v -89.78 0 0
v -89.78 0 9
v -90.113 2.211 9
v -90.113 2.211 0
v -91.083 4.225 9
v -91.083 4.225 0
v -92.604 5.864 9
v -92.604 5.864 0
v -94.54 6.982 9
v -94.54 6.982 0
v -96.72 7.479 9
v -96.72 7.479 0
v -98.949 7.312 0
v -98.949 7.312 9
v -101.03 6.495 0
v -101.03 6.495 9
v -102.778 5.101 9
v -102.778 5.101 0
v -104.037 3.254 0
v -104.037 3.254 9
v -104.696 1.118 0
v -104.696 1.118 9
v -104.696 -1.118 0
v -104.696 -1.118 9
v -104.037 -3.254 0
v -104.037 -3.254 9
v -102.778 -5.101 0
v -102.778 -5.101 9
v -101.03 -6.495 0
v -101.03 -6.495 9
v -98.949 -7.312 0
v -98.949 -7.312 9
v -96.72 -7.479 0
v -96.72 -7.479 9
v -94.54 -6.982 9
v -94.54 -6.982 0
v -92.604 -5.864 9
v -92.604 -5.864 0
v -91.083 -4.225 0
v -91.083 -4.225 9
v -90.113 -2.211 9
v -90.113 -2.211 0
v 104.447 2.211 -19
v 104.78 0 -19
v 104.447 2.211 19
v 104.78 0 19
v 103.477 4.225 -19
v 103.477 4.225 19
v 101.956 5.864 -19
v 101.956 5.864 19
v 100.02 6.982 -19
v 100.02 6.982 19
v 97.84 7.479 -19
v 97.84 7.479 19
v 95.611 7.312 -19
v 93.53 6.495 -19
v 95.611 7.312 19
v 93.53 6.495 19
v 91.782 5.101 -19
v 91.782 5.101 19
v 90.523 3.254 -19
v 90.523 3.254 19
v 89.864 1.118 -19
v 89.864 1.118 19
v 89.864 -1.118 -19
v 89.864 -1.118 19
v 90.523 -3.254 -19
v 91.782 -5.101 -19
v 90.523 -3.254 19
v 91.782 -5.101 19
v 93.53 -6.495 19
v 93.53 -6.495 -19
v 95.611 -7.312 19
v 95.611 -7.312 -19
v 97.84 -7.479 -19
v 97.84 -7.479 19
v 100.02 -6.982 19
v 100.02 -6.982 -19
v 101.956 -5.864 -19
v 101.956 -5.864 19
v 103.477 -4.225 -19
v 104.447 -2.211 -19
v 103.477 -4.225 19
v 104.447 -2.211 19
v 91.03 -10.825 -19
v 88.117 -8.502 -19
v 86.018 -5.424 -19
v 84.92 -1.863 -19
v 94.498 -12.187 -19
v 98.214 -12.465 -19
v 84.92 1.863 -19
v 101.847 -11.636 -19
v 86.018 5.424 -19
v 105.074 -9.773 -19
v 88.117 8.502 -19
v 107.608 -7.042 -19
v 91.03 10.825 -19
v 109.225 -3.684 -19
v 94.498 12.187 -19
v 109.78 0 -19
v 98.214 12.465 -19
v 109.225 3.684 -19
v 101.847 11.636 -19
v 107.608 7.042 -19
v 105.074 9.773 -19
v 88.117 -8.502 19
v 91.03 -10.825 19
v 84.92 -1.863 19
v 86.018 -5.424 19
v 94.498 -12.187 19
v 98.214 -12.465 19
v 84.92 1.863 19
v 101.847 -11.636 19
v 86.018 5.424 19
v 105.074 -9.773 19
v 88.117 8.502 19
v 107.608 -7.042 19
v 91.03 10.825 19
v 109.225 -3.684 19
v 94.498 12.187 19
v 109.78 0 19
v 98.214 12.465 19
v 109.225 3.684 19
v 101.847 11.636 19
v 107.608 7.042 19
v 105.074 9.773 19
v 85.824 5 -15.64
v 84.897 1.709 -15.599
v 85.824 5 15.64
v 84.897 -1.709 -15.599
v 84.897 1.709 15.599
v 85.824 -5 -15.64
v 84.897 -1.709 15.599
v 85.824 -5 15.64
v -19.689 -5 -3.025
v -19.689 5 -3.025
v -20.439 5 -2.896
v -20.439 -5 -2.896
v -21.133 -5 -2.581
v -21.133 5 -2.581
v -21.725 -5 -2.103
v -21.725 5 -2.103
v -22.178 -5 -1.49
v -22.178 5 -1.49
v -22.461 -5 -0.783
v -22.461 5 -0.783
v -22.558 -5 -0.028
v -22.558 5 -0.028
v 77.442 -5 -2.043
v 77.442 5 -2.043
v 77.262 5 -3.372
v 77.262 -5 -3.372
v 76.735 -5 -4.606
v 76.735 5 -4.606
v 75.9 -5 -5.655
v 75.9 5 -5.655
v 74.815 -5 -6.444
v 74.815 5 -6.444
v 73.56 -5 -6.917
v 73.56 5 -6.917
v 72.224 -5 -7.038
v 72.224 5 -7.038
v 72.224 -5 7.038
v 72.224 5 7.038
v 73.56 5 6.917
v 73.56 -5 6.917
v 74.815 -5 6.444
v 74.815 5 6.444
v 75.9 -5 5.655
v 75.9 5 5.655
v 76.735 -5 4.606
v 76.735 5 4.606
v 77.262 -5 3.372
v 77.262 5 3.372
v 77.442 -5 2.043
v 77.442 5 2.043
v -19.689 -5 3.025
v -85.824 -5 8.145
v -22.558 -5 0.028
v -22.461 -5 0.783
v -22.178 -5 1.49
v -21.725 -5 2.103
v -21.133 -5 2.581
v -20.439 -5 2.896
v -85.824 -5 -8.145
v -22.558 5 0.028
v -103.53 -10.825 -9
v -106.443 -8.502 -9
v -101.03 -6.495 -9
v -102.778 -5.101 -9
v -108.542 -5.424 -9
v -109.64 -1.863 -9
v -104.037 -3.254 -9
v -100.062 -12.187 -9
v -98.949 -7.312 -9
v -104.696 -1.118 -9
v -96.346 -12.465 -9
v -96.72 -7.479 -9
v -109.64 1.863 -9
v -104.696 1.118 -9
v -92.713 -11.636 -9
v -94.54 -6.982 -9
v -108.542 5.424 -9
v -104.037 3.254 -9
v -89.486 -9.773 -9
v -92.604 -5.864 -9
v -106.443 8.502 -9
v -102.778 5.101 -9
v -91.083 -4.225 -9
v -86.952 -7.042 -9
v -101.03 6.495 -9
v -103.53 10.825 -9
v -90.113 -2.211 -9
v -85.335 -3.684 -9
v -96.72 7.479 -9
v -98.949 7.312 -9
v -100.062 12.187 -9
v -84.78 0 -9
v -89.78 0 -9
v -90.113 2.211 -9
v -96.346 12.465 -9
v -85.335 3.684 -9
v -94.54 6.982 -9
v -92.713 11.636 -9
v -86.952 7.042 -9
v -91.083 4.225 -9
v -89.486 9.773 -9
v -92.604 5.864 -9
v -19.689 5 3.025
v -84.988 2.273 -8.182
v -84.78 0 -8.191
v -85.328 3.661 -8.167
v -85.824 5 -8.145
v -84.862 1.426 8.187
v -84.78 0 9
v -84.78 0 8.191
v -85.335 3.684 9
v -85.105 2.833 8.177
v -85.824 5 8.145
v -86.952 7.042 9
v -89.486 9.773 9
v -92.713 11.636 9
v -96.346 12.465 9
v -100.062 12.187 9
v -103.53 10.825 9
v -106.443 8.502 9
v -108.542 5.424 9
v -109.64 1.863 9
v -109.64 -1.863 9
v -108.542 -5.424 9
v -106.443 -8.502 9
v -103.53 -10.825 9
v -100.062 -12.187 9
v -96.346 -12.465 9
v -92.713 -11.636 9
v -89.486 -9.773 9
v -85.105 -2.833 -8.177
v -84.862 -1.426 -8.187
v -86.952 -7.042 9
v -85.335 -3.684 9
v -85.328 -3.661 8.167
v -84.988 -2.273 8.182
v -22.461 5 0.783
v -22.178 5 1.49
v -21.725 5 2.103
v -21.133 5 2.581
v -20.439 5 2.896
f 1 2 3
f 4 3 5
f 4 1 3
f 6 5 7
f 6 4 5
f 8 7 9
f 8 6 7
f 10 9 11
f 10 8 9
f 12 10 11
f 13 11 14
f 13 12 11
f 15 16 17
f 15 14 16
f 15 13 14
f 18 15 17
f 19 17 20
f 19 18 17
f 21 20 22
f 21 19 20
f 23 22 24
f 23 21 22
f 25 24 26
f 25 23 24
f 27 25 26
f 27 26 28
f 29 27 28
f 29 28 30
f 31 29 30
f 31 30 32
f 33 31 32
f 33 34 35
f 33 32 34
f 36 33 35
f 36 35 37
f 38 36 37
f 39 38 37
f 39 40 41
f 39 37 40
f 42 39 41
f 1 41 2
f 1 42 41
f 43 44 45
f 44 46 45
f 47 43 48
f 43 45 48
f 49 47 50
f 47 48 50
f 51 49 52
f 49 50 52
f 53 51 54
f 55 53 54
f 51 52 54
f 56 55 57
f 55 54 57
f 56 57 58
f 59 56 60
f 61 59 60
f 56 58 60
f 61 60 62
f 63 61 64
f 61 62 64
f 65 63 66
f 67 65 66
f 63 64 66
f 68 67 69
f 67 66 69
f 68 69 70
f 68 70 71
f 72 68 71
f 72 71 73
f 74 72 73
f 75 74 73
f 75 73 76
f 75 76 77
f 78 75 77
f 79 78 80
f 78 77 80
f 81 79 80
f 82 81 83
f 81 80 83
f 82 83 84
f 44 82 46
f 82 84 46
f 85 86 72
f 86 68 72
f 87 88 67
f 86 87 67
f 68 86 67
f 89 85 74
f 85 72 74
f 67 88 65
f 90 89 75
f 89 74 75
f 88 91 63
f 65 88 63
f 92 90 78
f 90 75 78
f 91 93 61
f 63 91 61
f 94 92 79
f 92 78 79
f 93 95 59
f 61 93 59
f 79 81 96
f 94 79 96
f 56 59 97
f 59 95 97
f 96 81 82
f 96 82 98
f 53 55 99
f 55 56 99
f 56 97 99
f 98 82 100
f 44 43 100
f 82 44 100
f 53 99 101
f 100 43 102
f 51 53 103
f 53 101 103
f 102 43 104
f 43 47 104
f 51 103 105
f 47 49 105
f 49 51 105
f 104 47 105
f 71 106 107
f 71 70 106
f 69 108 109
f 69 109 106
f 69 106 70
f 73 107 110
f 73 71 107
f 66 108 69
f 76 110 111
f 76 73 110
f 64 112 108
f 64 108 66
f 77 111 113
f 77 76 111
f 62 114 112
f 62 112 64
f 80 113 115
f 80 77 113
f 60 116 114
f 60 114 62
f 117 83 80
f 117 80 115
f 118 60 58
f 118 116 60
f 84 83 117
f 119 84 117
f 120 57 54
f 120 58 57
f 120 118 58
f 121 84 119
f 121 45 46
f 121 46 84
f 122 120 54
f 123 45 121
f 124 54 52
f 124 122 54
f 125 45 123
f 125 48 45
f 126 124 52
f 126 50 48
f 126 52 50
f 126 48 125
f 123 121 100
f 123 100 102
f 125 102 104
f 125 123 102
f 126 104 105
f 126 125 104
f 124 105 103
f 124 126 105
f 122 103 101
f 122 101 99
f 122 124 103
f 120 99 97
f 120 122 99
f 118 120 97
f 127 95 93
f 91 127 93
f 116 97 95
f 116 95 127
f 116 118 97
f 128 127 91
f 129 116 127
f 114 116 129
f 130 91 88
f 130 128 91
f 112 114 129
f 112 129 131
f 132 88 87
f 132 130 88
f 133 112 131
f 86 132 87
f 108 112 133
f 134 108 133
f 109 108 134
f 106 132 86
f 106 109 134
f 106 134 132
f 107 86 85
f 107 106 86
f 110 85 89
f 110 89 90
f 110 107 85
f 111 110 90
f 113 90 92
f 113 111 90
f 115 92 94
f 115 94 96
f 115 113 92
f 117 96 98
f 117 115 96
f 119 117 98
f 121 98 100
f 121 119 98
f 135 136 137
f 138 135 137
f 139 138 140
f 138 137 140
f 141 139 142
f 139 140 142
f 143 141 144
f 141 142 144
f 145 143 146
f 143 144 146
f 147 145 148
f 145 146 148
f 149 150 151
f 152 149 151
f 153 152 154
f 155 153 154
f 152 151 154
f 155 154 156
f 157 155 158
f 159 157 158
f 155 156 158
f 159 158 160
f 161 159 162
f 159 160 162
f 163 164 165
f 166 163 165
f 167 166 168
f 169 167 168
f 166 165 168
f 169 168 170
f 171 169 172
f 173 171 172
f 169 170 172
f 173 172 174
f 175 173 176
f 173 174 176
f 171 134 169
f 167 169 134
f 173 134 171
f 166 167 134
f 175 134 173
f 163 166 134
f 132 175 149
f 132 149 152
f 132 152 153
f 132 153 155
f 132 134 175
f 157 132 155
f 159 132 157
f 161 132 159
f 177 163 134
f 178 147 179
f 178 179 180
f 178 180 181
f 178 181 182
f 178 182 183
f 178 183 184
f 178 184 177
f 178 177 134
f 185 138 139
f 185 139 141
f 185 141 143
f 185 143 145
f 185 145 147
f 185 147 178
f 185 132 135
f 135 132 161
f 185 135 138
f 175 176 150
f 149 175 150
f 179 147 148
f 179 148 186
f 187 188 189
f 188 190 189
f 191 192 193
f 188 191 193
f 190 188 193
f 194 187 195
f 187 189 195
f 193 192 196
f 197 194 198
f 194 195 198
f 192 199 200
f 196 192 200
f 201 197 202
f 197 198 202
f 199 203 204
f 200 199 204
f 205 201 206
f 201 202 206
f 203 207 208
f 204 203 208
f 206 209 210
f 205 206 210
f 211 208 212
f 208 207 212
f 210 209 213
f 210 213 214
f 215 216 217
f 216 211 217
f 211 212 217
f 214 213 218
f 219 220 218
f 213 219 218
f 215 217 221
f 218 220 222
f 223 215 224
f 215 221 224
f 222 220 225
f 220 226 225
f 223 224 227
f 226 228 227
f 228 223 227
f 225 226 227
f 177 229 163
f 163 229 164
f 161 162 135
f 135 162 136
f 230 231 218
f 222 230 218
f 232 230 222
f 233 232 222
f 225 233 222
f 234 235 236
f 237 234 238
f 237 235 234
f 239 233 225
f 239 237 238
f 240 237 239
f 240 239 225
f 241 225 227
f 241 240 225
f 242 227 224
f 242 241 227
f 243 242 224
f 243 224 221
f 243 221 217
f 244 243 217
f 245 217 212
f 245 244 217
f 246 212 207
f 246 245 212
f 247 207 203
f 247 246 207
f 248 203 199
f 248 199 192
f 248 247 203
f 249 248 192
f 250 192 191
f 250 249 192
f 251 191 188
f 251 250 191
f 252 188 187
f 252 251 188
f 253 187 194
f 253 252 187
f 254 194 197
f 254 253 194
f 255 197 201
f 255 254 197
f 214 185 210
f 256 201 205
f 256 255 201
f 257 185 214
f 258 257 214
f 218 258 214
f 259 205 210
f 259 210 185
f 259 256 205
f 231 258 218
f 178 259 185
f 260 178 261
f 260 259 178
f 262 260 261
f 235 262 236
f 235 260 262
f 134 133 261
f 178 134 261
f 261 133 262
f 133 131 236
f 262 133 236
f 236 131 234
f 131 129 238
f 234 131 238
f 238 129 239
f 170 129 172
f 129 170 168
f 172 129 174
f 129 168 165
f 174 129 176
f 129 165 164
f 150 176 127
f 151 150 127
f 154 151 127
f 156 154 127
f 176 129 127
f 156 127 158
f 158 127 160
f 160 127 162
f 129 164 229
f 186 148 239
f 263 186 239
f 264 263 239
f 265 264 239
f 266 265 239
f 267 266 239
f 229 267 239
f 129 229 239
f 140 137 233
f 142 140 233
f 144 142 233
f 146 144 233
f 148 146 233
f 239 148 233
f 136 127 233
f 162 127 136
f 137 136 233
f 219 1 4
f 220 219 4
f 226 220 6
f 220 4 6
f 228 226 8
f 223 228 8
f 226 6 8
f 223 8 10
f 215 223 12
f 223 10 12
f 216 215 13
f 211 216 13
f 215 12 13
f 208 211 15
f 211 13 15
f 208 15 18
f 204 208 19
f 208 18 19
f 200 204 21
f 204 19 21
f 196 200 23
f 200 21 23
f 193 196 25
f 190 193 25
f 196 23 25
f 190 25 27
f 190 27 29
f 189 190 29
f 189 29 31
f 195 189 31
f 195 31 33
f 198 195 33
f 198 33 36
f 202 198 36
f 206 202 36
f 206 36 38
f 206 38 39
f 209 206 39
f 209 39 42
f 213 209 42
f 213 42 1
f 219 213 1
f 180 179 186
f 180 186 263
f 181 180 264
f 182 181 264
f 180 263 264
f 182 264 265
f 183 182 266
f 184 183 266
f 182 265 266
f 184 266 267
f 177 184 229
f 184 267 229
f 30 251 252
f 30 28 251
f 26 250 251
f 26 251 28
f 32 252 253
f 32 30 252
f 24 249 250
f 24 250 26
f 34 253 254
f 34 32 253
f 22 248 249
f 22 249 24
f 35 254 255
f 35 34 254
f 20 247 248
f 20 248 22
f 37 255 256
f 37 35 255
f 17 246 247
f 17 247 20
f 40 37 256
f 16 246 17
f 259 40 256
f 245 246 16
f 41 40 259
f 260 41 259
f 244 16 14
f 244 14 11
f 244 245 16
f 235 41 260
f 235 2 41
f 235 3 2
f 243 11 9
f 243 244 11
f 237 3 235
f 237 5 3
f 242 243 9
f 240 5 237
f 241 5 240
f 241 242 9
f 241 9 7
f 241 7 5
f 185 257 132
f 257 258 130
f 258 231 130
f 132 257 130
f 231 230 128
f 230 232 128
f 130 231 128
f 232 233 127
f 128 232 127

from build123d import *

# Parameters (mm, degrees)
SKETCH1_R           = 12.5
BOSS_EXTRUDE1_DEPTH = 9
SKETCH2_R           = 12.5
BOSS_EXTRUDE2_DEPTH = 19
BOSS_EXTRUDE3_DEPTH = 5
CUT_EXTRUDE1_DEPTH  = 26.5
SKETCH5_R           = 7.5
CUT_EXTRUDE2_DEPTH  = 26.5


with BuildPart() as part:
    # Sketch1 → Boss-Extrude1 (new, symmetric)
    with BuildSketch(Plane.XY):
        with Locations((-97.28, 0)):
            Circle(SKETCH1_R)
    extrude(amount=BOSS_EXTRUDE1_DEPTH, both=True)



with BuildPart() as body_2:
    # Sketch2 → Boss-Extrude2 (new, symmetric)
    with BuildSketch(Plane.XY):
        with Locations((97.28, 0)):
            Circle(SKETCH2_R)
    extrude(amount=BOSS_EXTRUDE2_DEPTH, both=True)


with BuildPart() as part_1:
    add(part.part)

    add(body_2.part)  # Boss-Extrude3 merges body 2
    # Sketch3 → Boss-Extrude3 (add, symmetric)
    with BuildSketch(Plane(origin=(0, 0, 0), x_dir=(1, 0, 0), z_dir=(0, 1, 0))):
        Polygon((-97.28, 7.645187817), (97.28, 16.139860869), (97.28, -16.139860869), (-97.28, -7.645187817), align=None)
    extrude(amount=BOSS_EXTRUDE3_DEPTH, both=True)

    # Sketch4 → Cut-Extrude1 (cut, symmetric)
    with BuildSketch(Plane(origin=(0, 5, 0), x_dir=(1, 0, 0), z_dir=(0, 1, 0))):
        with BuildLine():
            Line((72.223918829, 7.038267258), (-19.688842396, 3.025269438))
            ThreePointArc((-19.688842396, 3.025269438), (-21.72507612, 2.102663941), (-22.557984234, 0.028124773))
            Line((-22.557984234, 0.028124773), (-22.557984234, -0.028124773))
            ThreePointArc((-22.557984234, -0.028124773), (-21.72507612, -2.102663941), (-19.688842396, -3.025269438))
            Line((-19.688842396, -3.025269438), (72.223918829, -7.038267258))
            ThreePointArc((72.223918829, -7.038267258), (75.899581045, -5.654845961), (77.442015766, -2.04302615))
            Line((77.442015766, -2.04302615), (77.442015766, 2.04302615))
            ThreePointArc((77.442015766, 2.04302615), (75.899581045, 5.654845961), (72.223918829, 7.038267258))
        make_face()
    extrude(amount=CUT_EXTRUDE1_DEPTH, both=True, mode=Mode.SUBTRACT)

    # Sketch5 → Cut-Extrude2 (cut, symmetric)
    with BuildSketch(Plane.XY):
        with Locations((-97.28, 0)):
            Circle(SKETCH5_R)
        with Locations((97.28, 0)):
            Circle(SKETCH5_R)
    extrude(amount=CUT_EXTRUDE2_DEPTH, both=True, mode=Mode.SUBTRACT)


solid = part_1.part
